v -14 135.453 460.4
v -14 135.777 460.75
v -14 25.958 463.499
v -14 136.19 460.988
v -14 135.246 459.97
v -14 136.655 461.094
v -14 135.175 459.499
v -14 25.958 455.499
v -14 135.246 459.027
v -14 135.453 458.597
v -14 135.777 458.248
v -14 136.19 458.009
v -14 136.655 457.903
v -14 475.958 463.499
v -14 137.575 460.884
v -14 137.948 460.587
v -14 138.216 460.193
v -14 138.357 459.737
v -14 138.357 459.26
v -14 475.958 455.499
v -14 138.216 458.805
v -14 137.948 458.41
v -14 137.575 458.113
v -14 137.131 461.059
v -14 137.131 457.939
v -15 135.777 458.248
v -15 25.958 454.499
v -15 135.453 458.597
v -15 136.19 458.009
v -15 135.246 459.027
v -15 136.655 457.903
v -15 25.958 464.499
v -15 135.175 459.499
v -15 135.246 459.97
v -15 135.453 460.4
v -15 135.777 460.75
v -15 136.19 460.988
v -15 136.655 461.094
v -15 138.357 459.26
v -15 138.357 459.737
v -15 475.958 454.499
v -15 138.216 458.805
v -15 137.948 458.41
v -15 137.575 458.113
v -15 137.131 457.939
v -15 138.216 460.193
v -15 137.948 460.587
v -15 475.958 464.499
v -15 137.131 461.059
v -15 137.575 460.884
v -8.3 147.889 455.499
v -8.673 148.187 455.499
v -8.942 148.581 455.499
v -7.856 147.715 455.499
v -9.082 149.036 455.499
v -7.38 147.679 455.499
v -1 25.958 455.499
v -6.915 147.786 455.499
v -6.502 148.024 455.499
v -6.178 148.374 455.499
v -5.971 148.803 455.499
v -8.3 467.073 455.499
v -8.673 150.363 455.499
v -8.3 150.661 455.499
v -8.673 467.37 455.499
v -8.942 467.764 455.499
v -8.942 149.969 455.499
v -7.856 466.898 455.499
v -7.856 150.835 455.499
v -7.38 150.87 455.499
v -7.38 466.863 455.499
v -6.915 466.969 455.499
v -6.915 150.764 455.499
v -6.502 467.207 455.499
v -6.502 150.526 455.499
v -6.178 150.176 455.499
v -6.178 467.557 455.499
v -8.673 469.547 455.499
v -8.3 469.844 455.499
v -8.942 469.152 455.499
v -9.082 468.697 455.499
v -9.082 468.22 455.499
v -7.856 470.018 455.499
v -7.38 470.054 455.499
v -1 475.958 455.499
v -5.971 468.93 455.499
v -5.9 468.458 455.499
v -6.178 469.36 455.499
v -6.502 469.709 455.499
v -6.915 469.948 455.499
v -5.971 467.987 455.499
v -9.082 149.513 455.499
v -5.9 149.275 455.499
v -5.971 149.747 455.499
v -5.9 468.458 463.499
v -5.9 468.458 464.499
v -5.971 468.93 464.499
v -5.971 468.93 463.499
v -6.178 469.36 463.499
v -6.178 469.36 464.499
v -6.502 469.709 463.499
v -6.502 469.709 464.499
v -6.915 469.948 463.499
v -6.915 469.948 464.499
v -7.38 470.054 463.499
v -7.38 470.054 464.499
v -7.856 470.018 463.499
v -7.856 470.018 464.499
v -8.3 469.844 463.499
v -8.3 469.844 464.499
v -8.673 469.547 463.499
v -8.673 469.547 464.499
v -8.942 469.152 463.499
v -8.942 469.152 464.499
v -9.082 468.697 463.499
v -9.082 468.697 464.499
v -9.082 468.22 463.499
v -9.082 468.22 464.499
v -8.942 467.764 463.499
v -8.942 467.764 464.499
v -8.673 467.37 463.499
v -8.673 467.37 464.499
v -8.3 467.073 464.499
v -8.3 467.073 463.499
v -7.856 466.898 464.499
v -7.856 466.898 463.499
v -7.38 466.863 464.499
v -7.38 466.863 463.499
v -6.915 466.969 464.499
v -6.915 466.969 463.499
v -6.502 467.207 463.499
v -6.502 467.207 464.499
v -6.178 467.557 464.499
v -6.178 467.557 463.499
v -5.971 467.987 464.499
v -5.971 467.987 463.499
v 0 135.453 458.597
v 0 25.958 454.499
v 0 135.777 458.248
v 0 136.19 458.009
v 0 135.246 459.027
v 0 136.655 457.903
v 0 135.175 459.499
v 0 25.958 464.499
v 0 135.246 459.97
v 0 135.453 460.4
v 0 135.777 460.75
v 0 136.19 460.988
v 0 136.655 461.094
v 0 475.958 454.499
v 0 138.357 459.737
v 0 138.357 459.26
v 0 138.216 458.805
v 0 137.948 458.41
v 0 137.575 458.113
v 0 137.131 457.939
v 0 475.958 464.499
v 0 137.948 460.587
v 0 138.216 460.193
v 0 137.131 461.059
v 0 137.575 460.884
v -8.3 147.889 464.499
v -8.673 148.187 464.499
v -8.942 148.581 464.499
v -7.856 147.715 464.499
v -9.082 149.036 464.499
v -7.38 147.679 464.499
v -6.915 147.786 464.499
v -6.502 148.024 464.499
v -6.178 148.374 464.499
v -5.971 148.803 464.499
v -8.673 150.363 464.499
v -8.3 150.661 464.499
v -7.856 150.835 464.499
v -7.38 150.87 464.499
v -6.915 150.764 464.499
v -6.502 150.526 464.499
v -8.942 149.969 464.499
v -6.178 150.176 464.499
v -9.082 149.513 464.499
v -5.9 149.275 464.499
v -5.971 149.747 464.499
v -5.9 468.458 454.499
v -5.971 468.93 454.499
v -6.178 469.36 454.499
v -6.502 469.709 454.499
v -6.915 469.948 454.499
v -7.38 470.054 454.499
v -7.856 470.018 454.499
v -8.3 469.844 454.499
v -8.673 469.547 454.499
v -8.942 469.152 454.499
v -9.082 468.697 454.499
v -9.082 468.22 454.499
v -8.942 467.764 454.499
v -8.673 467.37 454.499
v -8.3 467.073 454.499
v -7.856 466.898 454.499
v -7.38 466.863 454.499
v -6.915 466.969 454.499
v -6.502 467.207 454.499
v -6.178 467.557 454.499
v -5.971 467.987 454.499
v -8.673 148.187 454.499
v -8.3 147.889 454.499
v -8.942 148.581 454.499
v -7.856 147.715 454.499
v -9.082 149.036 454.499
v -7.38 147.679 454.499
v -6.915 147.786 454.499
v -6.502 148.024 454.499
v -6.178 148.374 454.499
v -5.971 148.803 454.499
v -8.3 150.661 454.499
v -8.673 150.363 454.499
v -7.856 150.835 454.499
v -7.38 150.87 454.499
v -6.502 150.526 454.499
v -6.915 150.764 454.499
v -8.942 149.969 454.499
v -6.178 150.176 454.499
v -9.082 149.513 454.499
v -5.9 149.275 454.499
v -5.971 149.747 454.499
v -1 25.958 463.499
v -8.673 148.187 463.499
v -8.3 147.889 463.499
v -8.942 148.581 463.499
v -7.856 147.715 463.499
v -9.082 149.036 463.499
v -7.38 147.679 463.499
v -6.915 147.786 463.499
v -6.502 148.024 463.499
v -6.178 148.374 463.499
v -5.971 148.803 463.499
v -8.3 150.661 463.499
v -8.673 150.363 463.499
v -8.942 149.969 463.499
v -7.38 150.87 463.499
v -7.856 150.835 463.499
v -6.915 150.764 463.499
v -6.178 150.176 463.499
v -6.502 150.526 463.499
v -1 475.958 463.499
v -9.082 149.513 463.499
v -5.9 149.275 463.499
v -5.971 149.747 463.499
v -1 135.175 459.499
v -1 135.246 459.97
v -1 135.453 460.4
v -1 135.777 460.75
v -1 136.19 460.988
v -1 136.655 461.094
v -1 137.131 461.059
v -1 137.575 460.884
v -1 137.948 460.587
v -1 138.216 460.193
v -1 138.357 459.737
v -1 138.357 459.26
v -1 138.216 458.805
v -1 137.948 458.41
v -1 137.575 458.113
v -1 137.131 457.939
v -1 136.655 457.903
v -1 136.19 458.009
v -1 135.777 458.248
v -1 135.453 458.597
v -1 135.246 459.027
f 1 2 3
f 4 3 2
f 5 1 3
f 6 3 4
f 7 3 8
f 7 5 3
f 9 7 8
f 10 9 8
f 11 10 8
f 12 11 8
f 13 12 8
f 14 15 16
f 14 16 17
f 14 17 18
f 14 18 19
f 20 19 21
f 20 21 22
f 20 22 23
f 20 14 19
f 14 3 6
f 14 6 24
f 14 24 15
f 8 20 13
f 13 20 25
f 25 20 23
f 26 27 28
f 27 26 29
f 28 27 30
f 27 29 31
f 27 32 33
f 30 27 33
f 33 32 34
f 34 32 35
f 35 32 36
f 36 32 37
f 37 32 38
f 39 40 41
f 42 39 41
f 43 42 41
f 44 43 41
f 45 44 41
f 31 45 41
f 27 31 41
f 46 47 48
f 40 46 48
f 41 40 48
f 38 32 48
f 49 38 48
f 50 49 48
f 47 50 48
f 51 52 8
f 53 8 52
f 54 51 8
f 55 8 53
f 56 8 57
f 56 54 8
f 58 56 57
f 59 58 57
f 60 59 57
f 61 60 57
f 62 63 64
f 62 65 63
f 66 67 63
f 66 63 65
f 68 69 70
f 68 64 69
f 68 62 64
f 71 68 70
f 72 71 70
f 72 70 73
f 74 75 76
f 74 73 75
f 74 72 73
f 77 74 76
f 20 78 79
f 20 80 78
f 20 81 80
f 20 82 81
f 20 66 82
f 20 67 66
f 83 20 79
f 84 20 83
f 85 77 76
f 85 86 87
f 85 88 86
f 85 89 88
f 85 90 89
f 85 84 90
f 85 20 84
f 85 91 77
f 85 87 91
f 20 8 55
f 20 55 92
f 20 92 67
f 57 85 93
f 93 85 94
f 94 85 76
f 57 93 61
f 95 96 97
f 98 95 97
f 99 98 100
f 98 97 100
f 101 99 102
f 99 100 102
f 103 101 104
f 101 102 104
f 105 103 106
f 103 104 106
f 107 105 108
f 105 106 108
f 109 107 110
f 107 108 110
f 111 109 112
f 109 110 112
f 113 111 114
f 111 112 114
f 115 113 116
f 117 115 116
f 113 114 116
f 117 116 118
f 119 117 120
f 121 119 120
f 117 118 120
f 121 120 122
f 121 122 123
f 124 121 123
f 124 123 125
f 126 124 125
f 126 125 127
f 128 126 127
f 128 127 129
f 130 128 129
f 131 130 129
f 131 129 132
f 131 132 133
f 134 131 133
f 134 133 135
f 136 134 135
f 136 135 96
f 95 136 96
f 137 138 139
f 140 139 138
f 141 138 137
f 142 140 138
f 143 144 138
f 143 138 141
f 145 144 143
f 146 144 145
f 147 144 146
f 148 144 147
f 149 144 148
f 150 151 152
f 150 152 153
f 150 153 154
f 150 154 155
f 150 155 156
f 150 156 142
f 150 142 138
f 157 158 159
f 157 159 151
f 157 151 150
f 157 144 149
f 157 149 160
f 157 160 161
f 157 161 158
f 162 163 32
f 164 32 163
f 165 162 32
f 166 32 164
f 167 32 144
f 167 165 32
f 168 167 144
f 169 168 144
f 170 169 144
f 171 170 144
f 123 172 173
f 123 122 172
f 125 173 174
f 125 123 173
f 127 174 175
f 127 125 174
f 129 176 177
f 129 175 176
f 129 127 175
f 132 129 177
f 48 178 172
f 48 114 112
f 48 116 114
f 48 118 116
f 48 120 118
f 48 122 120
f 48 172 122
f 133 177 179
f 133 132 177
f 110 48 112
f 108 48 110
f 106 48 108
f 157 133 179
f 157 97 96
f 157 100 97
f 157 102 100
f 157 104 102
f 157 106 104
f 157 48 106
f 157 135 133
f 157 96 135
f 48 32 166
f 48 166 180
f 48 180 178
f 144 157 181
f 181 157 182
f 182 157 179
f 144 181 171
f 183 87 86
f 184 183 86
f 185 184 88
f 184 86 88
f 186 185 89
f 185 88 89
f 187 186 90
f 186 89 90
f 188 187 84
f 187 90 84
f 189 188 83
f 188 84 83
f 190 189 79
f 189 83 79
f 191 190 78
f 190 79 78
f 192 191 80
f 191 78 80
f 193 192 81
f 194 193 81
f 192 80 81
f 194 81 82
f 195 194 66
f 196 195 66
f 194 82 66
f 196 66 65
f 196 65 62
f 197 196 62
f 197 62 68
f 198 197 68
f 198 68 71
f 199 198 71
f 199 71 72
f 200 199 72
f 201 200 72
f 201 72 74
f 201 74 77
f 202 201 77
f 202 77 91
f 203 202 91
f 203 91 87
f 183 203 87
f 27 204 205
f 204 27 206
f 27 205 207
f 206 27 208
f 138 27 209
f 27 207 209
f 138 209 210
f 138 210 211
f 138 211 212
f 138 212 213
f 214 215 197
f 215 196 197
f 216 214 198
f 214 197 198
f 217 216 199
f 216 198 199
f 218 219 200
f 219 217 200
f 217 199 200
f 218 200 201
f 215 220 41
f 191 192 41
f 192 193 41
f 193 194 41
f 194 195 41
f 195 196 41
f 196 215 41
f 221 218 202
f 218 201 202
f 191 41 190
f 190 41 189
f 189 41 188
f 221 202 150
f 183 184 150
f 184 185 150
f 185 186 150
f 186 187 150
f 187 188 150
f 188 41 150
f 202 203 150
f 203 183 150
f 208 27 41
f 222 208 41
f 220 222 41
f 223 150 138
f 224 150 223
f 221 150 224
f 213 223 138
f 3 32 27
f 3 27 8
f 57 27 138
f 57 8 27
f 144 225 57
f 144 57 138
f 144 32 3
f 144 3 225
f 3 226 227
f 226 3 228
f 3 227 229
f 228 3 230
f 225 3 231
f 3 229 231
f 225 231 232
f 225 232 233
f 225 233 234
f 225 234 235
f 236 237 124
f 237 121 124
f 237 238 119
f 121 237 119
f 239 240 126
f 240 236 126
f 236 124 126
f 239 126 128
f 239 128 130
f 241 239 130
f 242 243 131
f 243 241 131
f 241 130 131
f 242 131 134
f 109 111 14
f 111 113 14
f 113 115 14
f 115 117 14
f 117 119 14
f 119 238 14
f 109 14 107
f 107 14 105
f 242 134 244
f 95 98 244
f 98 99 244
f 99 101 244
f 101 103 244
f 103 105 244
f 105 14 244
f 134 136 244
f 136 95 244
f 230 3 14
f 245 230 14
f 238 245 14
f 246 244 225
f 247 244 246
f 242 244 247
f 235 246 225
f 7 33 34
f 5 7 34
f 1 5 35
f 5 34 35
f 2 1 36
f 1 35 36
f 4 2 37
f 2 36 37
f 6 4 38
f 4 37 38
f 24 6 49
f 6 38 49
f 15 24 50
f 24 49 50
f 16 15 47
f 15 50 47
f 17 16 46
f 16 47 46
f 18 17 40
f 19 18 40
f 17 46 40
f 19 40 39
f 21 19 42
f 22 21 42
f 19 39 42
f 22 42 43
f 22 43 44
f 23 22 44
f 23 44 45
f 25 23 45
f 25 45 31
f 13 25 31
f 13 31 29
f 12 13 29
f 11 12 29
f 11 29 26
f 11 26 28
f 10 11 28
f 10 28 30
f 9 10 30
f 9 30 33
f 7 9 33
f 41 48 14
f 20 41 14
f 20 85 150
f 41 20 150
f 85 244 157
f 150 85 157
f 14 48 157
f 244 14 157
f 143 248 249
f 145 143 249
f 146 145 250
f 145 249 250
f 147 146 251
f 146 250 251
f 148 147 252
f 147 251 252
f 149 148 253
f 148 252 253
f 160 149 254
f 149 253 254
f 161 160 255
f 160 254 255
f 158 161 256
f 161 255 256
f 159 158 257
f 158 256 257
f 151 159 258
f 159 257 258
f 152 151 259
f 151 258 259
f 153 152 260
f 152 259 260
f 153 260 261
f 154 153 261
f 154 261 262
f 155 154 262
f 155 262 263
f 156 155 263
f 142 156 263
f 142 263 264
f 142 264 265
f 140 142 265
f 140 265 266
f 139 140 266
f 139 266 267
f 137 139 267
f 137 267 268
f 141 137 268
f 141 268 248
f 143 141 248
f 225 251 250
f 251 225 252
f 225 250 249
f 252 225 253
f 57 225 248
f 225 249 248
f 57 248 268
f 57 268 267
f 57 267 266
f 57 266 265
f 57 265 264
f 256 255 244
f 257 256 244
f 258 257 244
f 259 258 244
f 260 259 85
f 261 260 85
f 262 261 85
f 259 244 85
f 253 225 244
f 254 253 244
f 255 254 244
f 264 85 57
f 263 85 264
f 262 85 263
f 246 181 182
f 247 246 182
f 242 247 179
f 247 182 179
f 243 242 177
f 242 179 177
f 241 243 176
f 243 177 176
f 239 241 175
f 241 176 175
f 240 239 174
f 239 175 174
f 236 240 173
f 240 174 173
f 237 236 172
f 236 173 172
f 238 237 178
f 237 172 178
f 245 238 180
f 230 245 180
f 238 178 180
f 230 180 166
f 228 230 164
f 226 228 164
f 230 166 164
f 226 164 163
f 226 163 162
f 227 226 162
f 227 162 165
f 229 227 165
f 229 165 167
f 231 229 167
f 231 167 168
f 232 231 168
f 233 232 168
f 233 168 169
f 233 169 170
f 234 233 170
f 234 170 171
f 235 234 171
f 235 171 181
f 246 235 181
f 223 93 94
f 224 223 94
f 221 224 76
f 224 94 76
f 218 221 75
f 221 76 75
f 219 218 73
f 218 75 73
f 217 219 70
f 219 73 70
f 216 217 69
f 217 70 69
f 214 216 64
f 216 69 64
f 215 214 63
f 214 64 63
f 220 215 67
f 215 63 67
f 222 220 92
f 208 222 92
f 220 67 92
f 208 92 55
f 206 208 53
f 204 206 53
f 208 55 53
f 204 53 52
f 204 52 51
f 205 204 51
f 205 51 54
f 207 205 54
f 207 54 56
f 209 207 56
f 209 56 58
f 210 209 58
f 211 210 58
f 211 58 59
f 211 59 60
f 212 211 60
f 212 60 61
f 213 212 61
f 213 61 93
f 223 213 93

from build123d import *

# Parameters (mm, degrees)
SKETCH_1_W          = 15
SKETCH_1_H          = 475.958242536
SKETCH_1_R          = 1.6
EXTRUDE_1_DEPTH     = 10
SKETCH_2_W          = 15
SKETCH_2_H          = 25.958242536
CUT_EXTRUDE_1_DEPTH = 100
SKETCH_4_R          = 1.6
CUT_EXTRUDE_2_DEPTH = 15
SKETCH_5_W          = 13
SKETCH_5_H          = 8
CUT_EXTRUDE_3_DEPTH = 1000


with BuildPart() as part:
    # ｽｹｯﾁ1 → ﾎﾞｽ - 押し出し1 (new body)
    with BuildSketch(Plane.XY.offset(464.498723907)):
        with Locations((-7.5, 237.979121268)):
            Rectangle(SKETCH_1_W, SKETCH_1_H)
        with Locations((-7.5, 468.458242536)):
            Circle(SKETCH_1_R, mode=Mode.SUBTRACT)
        with Locations((-7.5, 149.274909628)):
            Circle(SKETCH_1_R, mode=Mode.SUBTRACT)
    extrude(amount=-EXTRUDE_1_DEPTH)

    # ｽｹｯﾁ2 → ｶｯﾄ - 押し出し1 (cut)
    with BuildSketch(Plane.XY.offset(464.498723907)):
        with Locations((-7.5, 12.979121268)):
            Rectangle(SKETCH_2_W, SKETCH_2_H)
    extrude(amount=-CUT_EXTRUDE_1_DEPTH, mode=Mode.SUBTRACT)

    # ｽｹｯﾁ4 → ｶｯﾄ - 押し出し2 (cut)
    with BuildSketch(Plane.ZY.offset(15)):
        with Locations(Location((459.498723907, 136.774909628, 0), (0, 0, 270))):
            Circle(SKETCH_4_R)
    extrude(amount=-CUT_EXTRUDE_2_DEPTH, mode=Mode.SUBTRACT)

    # ｽｹｯﾁ5 → ｶｯﾄ - 押し出し3 (cut)
    with BuildSketch(Plane(origin=(0, 475.958242536, 0), x_dir=(1, 0, 0), z_dir=(0, 1, 0))):
        with Locations((-7.5, -459.498723907)):
            Rectangle(SKETCH_5_W, SKETCH_5_H)
    extrude(amount=-CUT_EXTRUDE_3_DEPTH, mode=Mode.SUBTRACT)


solid = part.part
